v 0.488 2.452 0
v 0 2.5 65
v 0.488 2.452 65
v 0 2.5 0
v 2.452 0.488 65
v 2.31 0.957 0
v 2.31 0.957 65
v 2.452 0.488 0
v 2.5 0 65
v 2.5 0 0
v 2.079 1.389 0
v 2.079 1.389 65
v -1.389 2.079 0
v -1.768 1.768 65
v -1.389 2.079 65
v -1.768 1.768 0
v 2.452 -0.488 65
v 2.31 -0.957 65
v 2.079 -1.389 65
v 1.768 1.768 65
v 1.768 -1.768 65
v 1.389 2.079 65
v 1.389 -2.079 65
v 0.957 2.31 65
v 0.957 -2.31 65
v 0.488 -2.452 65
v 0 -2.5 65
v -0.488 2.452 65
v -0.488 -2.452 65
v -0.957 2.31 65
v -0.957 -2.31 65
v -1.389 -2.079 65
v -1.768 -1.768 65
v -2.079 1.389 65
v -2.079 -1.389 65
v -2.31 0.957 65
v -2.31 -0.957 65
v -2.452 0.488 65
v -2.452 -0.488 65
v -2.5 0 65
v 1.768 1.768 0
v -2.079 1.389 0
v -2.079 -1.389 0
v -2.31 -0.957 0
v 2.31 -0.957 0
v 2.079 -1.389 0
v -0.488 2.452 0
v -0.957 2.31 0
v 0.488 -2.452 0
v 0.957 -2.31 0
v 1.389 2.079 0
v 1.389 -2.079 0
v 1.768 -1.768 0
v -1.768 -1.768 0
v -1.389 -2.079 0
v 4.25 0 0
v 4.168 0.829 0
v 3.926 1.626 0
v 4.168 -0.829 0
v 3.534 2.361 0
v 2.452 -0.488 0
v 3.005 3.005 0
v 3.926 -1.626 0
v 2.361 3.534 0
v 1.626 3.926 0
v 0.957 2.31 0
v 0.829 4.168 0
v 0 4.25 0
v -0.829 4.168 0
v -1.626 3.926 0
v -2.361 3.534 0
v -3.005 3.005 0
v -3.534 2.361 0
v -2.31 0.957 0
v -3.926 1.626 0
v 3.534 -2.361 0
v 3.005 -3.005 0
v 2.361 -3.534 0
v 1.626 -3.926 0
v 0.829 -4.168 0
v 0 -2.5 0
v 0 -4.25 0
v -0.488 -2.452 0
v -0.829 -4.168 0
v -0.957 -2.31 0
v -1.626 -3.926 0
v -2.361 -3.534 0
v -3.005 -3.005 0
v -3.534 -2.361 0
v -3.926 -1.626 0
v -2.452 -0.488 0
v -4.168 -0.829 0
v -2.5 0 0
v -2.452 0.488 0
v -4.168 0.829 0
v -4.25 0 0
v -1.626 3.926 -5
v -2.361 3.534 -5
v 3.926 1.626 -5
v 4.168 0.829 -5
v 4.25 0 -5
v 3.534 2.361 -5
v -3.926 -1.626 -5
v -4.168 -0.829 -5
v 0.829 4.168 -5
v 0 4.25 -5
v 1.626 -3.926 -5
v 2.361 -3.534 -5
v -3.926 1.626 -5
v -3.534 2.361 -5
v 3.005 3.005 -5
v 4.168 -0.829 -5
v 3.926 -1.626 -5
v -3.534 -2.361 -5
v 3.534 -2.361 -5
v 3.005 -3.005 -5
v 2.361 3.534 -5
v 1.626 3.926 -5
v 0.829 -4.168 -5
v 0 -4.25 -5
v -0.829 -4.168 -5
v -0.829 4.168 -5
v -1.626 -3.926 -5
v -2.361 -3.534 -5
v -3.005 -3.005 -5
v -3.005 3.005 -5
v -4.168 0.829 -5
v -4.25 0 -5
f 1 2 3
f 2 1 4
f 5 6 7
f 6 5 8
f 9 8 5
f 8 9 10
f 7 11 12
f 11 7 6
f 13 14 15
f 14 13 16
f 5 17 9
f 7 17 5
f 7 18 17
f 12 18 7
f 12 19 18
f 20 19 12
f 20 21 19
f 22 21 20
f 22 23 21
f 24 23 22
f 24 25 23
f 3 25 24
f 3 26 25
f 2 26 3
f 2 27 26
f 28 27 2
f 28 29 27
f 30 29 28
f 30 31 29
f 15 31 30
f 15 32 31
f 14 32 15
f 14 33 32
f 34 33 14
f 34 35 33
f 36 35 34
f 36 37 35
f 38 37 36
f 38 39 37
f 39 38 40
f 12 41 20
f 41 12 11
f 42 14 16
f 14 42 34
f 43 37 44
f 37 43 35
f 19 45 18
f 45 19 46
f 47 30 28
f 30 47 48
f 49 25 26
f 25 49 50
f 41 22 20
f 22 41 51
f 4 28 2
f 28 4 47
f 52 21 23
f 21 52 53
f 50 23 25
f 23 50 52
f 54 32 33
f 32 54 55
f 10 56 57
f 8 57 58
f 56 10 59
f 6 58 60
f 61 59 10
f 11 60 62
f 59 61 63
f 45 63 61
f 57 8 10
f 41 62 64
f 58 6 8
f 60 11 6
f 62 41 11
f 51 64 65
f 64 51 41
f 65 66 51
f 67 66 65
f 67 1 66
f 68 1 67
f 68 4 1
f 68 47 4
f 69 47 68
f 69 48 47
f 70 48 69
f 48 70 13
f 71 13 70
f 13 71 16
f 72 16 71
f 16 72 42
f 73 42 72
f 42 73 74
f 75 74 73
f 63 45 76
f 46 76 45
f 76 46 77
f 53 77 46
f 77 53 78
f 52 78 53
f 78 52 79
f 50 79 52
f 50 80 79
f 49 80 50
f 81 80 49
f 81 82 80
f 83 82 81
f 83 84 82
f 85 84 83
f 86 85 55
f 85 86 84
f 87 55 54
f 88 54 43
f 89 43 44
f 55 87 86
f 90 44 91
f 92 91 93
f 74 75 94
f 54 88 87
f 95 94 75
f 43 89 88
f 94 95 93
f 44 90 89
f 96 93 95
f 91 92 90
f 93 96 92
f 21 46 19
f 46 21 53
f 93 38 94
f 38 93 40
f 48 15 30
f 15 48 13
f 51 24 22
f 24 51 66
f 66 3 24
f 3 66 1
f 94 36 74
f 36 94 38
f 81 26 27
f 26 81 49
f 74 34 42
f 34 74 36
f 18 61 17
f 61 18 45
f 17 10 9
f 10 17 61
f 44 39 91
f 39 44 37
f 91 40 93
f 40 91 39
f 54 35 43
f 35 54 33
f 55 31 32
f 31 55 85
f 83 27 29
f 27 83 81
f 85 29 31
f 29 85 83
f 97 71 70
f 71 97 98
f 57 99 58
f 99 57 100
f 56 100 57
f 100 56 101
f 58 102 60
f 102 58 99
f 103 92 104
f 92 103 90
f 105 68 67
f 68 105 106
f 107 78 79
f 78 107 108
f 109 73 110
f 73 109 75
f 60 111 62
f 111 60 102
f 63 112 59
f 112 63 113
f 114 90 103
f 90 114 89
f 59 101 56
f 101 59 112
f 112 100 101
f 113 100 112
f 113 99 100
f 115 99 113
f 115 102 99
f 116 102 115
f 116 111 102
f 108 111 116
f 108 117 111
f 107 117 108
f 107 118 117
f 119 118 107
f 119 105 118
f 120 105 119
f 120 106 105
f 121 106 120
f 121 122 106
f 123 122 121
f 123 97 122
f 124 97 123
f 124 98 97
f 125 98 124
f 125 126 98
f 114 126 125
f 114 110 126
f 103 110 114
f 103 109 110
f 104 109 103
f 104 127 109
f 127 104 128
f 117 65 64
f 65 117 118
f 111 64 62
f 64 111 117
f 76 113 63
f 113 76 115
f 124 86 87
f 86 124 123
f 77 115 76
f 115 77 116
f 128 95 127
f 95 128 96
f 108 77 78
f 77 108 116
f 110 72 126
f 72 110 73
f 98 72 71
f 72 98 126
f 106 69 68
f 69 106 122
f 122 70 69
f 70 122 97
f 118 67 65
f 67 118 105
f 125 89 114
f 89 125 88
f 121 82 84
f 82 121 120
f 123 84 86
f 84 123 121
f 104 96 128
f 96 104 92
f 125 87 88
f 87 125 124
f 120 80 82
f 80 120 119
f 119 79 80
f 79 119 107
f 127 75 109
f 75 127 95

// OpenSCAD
// Purchased hardware envelope; no modeled threads, not print.
$fn=32;
union(){cylinder(d=5,h=65);translate([0,0,-5])cylinder(d=8.5,h=5);}
